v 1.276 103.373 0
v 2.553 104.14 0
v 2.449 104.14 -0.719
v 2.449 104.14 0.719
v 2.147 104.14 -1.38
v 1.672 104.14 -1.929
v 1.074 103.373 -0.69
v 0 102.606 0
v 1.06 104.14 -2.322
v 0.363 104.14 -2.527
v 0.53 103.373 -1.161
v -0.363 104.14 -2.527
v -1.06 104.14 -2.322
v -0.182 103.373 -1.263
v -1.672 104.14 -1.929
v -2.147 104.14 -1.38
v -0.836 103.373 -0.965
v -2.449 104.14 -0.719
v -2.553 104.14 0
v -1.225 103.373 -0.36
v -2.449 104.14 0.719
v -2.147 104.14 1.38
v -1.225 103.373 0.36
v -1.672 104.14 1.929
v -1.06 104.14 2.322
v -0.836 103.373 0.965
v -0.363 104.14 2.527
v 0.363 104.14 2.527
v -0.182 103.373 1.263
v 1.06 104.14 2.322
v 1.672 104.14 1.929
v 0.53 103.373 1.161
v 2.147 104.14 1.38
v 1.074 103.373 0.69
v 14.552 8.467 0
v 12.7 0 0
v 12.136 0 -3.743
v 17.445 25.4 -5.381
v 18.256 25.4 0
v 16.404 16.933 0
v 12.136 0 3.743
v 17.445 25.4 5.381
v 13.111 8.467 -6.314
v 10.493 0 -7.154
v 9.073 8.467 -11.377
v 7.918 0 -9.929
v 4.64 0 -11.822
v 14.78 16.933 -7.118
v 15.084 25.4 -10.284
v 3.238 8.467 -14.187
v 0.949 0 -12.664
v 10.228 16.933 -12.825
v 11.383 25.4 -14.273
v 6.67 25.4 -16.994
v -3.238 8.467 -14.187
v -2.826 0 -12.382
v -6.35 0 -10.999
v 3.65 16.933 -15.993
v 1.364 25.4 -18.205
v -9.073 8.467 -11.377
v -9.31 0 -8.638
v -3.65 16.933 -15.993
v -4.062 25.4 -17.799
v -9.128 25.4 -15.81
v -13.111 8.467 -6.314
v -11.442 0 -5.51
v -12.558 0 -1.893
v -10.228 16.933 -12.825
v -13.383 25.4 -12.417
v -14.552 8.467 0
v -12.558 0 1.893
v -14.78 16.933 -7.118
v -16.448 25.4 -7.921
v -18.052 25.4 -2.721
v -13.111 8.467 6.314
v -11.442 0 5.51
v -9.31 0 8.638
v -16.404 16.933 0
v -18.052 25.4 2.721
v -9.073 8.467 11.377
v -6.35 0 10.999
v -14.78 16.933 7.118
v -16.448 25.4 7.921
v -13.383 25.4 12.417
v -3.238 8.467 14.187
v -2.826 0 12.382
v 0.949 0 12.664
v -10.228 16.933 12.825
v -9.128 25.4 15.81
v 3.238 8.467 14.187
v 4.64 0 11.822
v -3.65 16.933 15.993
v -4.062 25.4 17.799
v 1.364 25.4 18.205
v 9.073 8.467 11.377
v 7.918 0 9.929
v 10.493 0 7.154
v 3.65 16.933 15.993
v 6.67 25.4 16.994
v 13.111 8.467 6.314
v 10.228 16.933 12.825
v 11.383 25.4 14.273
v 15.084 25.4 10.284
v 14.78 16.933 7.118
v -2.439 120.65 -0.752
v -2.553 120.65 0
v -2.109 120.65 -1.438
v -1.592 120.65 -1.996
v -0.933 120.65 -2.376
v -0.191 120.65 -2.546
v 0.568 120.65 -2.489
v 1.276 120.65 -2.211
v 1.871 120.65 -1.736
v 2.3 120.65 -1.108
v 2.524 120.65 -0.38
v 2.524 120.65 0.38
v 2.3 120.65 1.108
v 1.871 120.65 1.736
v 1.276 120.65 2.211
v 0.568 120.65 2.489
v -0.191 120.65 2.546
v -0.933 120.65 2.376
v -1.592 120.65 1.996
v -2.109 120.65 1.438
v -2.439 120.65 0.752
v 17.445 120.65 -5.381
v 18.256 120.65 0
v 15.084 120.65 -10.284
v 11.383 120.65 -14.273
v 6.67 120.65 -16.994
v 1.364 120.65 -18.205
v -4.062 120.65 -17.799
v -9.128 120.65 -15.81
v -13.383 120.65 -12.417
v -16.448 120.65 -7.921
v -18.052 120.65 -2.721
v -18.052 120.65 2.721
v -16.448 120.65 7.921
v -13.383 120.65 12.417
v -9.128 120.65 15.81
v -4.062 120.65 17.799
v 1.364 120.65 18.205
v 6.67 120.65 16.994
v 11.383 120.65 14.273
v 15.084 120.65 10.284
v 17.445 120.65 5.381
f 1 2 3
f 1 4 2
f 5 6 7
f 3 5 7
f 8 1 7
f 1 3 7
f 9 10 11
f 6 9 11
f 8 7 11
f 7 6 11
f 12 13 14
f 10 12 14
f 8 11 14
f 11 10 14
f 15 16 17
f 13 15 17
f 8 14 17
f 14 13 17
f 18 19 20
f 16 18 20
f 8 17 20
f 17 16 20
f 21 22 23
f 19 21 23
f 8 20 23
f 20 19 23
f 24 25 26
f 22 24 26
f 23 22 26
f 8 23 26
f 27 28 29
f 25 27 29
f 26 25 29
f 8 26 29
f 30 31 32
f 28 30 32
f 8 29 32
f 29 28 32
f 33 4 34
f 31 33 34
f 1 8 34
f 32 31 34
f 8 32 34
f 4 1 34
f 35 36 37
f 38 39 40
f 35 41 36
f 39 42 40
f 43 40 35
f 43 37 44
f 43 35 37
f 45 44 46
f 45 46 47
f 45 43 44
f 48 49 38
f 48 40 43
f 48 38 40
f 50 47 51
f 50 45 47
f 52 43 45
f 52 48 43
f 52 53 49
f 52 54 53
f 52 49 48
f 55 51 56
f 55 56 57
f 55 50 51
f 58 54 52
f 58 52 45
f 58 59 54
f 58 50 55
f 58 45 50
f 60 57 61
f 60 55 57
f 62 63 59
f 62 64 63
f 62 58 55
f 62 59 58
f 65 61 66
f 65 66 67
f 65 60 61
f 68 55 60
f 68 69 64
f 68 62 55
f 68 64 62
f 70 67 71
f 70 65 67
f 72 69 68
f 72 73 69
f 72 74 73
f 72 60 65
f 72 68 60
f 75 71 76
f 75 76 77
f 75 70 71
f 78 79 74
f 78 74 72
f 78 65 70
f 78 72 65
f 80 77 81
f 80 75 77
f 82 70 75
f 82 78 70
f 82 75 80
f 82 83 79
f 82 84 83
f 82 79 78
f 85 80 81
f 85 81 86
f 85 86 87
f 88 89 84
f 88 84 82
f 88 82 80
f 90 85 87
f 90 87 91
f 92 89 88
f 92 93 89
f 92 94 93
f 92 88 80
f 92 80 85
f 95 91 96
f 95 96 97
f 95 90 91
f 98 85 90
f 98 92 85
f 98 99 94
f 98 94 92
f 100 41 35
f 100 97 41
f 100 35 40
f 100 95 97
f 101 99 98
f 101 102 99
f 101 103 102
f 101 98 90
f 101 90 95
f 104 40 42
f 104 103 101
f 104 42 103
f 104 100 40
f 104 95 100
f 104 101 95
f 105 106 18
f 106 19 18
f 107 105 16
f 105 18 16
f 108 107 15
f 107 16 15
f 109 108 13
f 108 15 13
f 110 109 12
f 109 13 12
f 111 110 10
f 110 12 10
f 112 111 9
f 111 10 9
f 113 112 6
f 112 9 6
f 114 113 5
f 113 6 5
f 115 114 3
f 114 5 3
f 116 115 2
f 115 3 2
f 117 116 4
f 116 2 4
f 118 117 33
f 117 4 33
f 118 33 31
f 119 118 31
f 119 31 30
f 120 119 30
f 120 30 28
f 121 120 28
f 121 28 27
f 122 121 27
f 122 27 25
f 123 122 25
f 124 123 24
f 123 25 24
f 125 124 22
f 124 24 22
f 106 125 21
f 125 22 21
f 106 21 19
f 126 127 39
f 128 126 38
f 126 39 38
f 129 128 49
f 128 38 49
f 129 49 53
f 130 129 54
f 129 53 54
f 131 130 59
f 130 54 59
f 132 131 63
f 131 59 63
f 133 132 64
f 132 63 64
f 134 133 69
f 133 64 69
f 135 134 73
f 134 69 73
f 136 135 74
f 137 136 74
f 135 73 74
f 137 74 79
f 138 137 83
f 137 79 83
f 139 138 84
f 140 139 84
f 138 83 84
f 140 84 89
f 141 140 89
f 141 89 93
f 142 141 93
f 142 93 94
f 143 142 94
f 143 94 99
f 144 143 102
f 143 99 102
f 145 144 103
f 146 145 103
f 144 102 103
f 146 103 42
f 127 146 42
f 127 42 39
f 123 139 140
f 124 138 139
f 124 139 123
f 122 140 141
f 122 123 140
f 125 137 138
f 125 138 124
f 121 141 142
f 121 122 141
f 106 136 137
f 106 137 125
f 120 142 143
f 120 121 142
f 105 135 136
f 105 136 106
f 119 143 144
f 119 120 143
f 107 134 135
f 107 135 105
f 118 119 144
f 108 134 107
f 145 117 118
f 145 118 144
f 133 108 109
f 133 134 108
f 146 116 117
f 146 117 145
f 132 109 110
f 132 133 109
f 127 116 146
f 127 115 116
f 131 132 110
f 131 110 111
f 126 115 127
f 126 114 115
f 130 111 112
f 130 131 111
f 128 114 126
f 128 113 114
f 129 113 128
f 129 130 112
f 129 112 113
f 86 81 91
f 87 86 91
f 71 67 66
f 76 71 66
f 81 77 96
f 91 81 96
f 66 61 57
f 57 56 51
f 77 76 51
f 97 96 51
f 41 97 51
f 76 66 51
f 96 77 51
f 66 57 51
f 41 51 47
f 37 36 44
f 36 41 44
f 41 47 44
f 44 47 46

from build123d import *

# Parameters (mm, degrees)
SKETCH1_R                   = 18.25625
BOSS_EXTRUDE1_DEPTH         = 120.65
CHAMFER1_SIZE               = 5.55625
CHAMFER1_SIZE2              = 25.4
F_1_4_20_TAPPED_HOLE1_D     = 5.1054
F_1_4_20_TAPPED_HOLE1_DEPTH = 16.51
F_1_4_20_TAPPED_HOLE1_TIP   = 1.533816902


with BuildPart() as part:
    # Sketch1 → Boss-Extrude1 (new body)
    with BuildSketch(Plane(origin=(0, 0, 0), x_dir=(1, 0, 0), z_dir=(0, 1, 0))):
        Circle(SKETCH1_R)
    extrude(amount=BOSS_EXTRUDE1_DEPTH)

    # Chamfer1
    chamfer1_edges = [part.edges().sort_by_distance(p)[0] for p in [
        (-18.25625, 0, 0),
    ]]
    chamfer1_side = [part.faces().sort_by_distance(p)[0] for p in [
        (0, 0, 0),
    ]]
    chamfer(chamfer1_edges, length=CHAMFER1_SIZE, length2=CHAMFER1_SIZE2, reference=chamfer1_side[0])

    # 1/4-20 Tapped Hole1
    with Locations(Plane(origin=(0, 120.65, 0), x_dir=(1, 0, 0), z_dir=(0, 1, 0))):
        with Locations((0, 0)):
            Hole(F_1_4_20_TAPPED_HOLE1_D / 2, depth=F_1_4_20_TAPPED_HOLE1_DEPTH)
            with Locations((0, 0, -(F_1_4_20_TAPPED_HOLE1_DEPTH + F_1_4_20_TAPPED_HOLE1_TIP / 2))):  # 118° drill point
                Cone(0, F_1_4_20_TAPPED_HOLE1_D / 2, F_1_4_20_TAPPED_HOLE1_TIP, mode=Mode.SUBTRACT)


solid = part.part
